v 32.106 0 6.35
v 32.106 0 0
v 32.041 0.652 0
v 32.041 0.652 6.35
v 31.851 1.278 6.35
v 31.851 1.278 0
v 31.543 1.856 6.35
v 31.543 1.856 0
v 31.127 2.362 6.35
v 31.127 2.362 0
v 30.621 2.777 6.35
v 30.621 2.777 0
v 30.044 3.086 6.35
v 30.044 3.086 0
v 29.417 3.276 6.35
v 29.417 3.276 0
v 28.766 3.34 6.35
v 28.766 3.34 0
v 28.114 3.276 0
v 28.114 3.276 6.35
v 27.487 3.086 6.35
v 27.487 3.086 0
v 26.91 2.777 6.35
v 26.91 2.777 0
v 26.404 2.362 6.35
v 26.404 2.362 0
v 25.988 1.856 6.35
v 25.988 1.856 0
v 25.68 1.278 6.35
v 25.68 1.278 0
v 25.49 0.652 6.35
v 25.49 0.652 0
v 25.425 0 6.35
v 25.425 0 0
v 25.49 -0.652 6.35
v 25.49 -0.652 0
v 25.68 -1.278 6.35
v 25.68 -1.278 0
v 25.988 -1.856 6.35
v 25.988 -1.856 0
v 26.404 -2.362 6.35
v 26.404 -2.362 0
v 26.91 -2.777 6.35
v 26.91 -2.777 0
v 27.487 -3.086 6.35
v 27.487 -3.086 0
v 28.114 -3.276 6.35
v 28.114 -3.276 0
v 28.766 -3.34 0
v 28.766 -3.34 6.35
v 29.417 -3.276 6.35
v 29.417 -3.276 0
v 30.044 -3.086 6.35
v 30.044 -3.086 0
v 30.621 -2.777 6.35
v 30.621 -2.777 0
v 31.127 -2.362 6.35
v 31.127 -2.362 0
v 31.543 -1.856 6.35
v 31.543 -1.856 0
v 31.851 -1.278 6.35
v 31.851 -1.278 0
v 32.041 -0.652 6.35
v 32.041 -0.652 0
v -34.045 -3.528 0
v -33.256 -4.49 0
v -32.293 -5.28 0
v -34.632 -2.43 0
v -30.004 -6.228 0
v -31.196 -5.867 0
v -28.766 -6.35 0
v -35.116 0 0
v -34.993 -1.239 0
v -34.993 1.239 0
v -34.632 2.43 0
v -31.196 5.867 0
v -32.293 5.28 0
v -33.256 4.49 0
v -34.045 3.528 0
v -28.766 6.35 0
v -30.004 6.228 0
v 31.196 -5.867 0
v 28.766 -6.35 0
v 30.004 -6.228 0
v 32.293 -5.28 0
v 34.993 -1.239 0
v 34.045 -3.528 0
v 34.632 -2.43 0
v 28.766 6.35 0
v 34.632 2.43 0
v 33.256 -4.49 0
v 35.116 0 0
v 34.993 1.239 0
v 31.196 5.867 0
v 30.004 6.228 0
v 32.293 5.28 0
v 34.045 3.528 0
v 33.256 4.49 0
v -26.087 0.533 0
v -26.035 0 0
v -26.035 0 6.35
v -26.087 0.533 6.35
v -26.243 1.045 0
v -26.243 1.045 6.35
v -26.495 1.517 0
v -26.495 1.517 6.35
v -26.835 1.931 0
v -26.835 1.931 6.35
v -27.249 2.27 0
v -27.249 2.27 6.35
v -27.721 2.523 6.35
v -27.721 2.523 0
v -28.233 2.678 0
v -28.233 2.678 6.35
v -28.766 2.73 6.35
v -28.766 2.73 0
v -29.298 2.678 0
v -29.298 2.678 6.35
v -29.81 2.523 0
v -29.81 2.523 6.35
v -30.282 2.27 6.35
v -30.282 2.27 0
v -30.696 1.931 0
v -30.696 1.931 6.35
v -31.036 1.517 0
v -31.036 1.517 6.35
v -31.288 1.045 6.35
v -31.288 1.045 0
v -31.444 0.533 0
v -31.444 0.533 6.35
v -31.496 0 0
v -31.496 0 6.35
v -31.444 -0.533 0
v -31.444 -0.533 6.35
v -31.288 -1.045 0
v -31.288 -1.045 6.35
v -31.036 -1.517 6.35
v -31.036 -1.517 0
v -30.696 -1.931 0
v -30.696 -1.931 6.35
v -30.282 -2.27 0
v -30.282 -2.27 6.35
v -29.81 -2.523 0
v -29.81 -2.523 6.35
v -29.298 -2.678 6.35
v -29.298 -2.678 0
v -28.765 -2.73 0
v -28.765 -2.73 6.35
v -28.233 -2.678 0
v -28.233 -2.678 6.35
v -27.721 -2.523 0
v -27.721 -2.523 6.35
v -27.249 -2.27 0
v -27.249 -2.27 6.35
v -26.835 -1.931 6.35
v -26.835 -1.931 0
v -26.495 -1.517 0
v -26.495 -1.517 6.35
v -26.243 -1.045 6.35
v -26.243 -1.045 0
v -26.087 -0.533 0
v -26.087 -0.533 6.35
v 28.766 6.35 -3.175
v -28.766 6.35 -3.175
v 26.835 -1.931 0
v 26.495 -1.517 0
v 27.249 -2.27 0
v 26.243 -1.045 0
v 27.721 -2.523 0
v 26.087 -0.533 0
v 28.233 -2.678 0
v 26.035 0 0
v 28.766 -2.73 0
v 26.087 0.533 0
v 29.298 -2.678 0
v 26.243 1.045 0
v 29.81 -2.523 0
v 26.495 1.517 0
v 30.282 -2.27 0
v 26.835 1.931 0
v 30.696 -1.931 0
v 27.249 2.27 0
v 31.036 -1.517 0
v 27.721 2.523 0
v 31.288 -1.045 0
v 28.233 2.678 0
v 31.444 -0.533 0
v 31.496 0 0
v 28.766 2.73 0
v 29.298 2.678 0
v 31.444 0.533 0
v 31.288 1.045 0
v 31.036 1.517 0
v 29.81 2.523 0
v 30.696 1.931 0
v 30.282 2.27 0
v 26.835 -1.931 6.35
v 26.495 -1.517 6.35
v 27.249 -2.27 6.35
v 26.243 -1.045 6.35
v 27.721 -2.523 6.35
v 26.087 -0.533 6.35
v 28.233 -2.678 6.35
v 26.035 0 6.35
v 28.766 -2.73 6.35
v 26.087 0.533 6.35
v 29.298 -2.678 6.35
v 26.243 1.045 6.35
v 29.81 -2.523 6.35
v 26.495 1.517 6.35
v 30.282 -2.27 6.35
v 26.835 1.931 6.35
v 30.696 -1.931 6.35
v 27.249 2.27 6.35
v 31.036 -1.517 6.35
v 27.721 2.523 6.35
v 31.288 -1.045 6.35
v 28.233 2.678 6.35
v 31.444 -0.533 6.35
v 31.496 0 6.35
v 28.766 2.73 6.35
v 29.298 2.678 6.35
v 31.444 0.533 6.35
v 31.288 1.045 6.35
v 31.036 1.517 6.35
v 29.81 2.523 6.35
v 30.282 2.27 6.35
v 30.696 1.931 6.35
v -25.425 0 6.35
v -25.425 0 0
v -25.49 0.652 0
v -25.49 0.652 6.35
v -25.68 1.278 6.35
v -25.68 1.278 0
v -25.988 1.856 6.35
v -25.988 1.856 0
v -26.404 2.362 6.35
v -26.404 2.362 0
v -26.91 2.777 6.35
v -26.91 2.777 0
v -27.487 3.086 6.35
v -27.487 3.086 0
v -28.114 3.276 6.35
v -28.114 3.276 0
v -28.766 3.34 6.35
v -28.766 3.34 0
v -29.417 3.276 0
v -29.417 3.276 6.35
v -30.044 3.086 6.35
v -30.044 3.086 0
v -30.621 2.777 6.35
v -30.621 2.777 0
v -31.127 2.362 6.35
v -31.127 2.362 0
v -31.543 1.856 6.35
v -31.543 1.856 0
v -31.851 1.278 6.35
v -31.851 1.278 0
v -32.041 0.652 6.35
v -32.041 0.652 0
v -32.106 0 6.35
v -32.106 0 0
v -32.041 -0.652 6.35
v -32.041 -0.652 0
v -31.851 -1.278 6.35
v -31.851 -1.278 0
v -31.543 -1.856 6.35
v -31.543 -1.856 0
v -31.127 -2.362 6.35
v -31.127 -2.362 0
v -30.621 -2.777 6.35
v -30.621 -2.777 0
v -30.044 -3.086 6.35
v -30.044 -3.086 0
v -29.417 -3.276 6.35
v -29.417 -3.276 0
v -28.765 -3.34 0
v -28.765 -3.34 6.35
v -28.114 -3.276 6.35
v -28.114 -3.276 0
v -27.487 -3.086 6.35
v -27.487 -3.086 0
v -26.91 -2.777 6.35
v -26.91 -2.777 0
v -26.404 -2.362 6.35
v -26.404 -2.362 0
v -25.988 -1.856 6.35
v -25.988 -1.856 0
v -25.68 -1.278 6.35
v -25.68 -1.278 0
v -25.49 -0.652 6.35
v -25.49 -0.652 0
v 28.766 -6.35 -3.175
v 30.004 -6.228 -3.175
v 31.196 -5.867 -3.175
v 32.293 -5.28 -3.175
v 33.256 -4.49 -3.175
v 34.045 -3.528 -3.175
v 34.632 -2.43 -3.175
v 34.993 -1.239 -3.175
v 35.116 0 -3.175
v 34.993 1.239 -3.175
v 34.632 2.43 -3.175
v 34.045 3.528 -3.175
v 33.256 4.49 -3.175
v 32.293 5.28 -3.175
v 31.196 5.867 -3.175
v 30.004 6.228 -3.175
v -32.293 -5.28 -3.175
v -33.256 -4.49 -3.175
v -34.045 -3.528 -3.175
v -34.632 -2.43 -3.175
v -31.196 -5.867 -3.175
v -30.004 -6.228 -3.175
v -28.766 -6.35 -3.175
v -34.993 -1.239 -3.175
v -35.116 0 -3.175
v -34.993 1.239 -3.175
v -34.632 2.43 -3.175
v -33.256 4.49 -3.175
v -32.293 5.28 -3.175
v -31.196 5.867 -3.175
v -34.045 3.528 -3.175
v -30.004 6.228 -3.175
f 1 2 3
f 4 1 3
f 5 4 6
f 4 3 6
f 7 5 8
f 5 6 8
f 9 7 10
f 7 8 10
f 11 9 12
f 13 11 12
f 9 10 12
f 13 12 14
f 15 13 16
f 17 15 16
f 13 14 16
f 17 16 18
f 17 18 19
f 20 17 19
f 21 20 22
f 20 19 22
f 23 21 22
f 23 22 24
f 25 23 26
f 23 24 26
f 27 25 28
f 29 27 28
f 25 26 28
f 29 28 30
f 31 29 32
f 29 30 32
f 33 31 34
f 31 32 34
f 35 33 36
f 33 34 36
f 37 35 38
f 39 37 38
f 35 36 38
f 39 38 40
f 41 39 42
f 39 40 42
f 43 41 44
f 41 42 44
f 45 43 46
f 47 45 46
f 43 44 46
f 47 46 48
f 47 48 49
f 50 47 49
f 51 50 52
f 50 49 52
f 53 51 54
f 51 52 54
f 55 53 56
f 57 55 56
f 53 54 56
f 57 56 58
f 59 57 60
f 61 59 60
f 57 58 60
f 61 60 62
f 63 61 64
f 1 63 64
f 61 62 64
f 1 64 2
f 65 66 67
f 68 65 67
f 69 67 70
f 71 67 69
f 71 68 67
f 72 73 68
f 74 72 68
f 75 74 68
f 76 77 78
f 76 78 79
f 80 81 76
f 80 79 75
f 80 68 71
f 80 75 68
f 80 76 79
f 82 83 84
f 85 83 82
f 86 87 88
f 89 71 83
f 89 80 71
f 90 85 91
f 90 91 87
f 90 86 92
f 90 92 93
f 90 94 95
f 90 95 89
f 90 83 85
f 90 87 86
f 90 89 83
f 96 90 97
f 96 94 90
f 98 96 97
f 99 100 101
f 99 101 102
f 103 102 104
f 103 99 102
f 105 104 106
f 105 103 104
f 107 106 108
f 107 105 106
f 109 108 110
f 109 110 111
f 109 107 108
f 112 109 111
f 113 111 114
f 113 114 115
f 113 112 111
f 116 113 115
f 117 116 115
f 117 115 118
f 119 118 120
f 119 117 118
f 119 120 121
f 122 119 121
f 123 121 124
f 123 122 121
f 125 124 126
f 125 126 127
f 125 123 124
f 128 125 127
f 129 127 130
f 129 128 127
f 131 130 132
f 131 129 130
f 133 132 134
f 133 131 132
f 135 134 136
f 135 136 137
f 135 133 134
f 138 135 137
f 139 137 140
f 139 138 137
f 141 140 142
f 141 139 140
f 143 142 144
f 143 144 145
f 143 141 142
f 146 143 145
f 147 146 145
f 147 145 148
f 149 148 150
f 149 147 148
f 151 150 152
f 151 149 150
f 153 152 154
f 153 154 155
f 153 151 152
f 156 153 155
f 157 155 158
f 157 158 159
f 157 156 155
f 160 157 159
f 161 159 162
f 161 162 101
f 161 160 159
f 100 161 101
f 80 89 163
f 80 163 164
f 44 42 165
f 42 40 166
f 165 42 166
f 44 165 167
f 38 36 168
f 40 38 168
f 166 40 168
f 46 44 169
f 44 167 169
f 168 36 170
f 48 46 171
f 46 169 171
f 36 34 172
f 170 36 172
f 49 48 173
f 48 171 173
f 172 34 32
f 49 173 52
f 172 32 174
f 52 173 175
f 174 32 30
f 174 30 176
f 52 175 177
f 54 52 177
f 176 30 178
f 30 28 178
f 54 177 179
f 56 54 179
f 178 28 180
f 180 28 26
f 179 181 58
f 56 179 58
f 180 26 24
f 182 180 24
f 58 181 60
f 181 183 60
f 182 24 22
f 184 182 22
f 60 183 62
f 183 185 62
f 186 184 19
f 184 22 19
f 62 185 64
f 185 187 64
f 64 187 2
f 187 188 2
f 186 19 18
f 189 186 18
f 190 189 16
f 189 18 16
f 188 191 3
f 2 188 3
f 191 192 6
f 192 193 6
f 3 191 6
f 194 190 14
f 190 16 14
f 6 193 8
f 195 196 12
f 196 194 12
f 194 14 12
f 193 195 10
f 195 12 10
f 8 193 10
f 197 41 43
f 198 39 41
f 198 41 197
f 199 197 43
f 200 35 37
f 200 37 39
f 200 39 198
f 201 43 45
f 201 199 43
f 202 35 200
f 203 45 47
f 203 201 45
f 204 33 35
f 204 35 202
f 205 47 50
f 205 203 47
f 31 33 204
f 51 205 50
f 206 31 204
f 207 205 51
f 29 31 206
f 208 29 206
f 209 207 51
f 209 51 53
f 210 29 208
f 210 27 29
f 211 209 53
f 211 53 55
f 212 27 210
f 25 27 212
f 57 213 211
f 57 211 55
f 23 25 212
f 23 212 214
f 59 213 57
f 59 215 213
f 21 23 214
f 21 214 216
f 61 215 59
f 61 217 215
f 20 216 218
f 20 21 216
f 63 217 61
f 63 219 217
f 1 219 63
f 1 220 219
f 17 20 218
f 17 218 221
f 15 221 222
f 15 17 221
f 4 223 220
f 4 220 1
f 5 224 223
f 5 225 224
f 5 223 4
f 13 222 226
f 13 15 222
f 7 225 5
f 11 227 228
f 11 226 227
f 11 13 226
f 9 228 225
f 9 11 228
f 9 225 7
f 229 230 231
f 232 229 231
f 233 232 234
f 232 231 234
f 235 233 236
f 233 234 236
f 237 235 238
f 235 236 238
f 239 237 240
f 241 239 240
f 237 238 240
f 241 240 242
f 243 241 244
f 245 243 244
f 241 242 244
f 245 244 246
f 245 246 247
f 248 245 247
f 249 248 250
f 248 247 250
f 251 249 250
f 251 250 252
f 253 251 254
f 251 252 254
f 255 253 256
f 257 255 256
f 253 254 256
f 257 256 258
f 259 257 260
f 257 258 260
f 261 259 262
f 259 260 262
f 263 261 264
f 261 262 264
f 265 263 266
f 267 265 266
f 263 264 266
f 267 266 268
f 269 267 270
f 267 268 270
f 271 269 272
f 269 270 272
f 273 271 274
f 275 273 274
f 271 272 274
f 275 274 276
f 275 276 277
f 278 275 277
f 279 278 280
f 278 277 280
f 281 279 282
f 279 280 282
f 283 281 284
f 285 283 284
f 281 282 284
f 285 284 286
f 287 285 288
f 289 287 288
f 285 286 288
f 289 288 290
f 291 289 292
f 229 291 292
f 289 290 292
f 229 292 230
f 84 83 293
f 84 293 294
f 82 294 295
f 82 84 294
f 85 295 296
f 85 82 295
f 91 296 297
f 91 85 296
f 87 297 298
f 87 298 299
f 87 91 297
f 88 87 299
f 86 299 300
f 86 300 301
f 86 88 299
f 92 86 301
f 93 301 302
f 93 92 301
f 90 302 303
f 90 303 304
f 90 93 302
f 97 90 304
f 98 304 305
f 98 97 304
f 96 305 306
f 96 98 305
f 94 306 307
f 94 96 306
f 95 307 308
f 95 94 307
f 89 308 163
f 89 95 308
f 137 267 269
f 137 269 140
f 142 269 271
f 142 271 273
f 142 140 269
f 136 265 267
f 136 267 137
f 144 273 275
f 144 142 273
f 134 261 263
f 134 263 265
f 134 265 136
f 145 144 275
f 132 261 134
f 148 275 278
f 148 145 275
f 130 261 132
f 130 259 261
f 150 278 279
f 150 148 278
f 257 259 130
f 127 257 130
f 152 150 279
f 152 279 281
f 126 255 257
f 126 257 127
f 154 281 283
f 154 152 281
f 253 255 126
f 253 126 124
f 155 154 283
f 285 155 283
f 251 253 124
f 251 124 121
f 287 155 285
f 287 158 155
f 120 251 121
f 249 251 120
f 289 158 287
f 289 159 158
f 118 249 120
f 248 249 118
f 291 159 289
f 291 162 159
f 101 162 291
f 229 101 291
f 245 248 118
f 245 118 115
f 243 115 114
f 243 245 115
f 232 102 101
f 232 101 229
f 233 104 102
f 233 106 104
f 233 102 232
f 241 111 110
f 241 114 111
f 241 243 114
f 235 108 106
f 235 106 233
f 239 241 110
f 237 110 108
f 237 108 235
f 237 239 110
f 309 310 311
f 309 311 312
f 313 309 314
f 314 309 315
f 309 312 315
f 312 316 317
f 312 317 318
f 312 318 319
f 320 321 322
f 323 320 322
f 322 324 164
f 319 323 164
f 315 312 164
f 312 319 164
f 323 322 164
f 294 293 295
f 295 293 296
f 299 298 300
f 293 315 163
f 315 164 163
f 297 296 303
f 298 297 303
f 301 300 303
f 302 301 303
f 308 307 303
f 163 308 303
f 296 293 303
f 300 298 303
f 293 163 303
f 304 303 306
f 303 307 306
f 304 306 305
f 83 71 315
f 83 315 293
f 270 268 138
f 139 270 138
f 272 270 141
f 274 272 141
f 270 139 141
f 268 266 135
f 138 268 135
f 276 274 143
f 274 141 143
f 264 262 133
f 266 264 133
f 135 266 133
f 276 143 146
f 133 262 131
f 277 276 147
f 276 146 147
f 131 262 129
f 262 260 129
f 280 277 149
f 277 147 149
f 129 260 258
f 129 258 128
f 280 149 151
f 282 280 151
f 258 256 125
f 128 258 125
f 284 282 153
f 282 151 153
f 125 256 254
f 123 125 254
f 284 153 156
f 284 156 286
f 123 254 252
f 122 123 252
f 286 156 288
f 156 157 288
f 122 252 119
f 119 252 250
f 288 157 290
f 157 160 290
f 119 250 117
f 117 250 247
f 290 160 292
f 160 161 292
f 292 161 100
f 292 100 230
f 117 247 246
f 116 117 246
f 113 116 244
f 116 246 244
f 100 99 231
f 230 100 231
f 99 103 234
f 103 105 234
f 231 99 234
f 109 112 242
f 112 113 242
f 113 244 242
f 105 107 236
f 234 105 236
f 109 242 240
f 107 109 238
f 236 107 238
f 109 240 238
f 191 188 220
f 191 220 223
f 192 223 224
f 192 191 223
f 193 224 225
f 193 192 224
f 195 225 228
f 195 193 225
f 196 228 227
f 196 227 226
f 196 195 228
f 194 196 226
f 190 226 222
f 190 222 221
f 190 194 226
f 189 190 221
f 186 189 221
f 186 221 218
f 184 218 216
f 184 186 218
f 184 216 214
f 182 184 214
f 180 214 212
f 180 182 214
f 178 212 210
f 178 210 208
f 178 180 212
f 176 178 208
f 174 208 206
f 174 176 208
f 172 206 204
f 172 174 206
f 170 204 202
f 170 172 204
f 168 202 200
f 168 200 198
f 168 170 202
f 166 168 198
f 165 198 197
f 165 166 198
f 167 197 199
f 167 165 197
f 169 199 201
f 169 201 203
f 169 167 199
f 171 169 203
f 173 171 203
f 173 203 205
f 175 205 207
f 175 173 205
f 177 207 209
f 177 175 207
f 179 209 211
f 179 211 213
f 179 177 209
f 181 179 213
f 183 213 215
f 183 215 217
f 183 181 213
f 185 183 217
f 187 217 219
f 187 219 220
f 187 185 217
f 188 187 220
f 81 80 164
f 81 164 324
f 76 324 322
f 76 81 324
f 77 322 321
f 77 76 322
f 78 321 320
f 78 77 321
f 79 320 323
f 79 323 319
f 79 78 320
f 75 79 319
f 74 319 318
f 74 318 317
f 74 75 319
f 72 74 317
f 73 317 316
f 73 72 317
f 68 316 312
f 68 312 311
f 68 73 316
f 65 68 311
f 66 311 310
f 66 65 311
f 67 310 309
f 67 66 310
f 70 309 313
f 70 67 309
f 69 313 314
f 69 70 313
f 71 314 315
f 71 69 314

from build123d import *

# Parameters (mm, degrees)
F0_R     = 3.3401
F0_R_2   = 2.7305
F1_DEPTH = 6.35
F3_DEPTH = 3.175


with BuildPart() as f1:
    # F0 (on Top) → F1 (new body)
    with BuildSketch(Plane.XY):
        with Locations((-28.7655, 0)):
            Circle(F0_R)
        with Locations((-28.7655, 0)):
            Circle(F0_R_2, mode=Mode.SUBTRACT)
        with Locations((28.7655, 0)):
            Circle(F0_R)
        with Locations((28.7655, 0)):
            Circle(F0_R_2, mode=Mode.SUBTRACT)
    extrude(amount=F1_DEPTH)


with BuildPart() as f3:
    # F2 (on Top) → F3 (new body)
    with BuildSketch(Plane.XY):
        with BuildLine():
            Line((28.7655, 6.35), (-28.7655, 6.35))
            ThreePointArc((-28.7655, 6.35), (-35.1155, 0), (-28.7655, -6.35))
            Line((-28.7655, -6.35), (28.7655, -6.35))
            ThreePointArc((28.7655, -6.35), (35.1155, 0), (28.7655, 6.35))
        make_face()
    extrude(amount=-F3_DEPTH)


solid = Compound([f1.part, f3.part])
